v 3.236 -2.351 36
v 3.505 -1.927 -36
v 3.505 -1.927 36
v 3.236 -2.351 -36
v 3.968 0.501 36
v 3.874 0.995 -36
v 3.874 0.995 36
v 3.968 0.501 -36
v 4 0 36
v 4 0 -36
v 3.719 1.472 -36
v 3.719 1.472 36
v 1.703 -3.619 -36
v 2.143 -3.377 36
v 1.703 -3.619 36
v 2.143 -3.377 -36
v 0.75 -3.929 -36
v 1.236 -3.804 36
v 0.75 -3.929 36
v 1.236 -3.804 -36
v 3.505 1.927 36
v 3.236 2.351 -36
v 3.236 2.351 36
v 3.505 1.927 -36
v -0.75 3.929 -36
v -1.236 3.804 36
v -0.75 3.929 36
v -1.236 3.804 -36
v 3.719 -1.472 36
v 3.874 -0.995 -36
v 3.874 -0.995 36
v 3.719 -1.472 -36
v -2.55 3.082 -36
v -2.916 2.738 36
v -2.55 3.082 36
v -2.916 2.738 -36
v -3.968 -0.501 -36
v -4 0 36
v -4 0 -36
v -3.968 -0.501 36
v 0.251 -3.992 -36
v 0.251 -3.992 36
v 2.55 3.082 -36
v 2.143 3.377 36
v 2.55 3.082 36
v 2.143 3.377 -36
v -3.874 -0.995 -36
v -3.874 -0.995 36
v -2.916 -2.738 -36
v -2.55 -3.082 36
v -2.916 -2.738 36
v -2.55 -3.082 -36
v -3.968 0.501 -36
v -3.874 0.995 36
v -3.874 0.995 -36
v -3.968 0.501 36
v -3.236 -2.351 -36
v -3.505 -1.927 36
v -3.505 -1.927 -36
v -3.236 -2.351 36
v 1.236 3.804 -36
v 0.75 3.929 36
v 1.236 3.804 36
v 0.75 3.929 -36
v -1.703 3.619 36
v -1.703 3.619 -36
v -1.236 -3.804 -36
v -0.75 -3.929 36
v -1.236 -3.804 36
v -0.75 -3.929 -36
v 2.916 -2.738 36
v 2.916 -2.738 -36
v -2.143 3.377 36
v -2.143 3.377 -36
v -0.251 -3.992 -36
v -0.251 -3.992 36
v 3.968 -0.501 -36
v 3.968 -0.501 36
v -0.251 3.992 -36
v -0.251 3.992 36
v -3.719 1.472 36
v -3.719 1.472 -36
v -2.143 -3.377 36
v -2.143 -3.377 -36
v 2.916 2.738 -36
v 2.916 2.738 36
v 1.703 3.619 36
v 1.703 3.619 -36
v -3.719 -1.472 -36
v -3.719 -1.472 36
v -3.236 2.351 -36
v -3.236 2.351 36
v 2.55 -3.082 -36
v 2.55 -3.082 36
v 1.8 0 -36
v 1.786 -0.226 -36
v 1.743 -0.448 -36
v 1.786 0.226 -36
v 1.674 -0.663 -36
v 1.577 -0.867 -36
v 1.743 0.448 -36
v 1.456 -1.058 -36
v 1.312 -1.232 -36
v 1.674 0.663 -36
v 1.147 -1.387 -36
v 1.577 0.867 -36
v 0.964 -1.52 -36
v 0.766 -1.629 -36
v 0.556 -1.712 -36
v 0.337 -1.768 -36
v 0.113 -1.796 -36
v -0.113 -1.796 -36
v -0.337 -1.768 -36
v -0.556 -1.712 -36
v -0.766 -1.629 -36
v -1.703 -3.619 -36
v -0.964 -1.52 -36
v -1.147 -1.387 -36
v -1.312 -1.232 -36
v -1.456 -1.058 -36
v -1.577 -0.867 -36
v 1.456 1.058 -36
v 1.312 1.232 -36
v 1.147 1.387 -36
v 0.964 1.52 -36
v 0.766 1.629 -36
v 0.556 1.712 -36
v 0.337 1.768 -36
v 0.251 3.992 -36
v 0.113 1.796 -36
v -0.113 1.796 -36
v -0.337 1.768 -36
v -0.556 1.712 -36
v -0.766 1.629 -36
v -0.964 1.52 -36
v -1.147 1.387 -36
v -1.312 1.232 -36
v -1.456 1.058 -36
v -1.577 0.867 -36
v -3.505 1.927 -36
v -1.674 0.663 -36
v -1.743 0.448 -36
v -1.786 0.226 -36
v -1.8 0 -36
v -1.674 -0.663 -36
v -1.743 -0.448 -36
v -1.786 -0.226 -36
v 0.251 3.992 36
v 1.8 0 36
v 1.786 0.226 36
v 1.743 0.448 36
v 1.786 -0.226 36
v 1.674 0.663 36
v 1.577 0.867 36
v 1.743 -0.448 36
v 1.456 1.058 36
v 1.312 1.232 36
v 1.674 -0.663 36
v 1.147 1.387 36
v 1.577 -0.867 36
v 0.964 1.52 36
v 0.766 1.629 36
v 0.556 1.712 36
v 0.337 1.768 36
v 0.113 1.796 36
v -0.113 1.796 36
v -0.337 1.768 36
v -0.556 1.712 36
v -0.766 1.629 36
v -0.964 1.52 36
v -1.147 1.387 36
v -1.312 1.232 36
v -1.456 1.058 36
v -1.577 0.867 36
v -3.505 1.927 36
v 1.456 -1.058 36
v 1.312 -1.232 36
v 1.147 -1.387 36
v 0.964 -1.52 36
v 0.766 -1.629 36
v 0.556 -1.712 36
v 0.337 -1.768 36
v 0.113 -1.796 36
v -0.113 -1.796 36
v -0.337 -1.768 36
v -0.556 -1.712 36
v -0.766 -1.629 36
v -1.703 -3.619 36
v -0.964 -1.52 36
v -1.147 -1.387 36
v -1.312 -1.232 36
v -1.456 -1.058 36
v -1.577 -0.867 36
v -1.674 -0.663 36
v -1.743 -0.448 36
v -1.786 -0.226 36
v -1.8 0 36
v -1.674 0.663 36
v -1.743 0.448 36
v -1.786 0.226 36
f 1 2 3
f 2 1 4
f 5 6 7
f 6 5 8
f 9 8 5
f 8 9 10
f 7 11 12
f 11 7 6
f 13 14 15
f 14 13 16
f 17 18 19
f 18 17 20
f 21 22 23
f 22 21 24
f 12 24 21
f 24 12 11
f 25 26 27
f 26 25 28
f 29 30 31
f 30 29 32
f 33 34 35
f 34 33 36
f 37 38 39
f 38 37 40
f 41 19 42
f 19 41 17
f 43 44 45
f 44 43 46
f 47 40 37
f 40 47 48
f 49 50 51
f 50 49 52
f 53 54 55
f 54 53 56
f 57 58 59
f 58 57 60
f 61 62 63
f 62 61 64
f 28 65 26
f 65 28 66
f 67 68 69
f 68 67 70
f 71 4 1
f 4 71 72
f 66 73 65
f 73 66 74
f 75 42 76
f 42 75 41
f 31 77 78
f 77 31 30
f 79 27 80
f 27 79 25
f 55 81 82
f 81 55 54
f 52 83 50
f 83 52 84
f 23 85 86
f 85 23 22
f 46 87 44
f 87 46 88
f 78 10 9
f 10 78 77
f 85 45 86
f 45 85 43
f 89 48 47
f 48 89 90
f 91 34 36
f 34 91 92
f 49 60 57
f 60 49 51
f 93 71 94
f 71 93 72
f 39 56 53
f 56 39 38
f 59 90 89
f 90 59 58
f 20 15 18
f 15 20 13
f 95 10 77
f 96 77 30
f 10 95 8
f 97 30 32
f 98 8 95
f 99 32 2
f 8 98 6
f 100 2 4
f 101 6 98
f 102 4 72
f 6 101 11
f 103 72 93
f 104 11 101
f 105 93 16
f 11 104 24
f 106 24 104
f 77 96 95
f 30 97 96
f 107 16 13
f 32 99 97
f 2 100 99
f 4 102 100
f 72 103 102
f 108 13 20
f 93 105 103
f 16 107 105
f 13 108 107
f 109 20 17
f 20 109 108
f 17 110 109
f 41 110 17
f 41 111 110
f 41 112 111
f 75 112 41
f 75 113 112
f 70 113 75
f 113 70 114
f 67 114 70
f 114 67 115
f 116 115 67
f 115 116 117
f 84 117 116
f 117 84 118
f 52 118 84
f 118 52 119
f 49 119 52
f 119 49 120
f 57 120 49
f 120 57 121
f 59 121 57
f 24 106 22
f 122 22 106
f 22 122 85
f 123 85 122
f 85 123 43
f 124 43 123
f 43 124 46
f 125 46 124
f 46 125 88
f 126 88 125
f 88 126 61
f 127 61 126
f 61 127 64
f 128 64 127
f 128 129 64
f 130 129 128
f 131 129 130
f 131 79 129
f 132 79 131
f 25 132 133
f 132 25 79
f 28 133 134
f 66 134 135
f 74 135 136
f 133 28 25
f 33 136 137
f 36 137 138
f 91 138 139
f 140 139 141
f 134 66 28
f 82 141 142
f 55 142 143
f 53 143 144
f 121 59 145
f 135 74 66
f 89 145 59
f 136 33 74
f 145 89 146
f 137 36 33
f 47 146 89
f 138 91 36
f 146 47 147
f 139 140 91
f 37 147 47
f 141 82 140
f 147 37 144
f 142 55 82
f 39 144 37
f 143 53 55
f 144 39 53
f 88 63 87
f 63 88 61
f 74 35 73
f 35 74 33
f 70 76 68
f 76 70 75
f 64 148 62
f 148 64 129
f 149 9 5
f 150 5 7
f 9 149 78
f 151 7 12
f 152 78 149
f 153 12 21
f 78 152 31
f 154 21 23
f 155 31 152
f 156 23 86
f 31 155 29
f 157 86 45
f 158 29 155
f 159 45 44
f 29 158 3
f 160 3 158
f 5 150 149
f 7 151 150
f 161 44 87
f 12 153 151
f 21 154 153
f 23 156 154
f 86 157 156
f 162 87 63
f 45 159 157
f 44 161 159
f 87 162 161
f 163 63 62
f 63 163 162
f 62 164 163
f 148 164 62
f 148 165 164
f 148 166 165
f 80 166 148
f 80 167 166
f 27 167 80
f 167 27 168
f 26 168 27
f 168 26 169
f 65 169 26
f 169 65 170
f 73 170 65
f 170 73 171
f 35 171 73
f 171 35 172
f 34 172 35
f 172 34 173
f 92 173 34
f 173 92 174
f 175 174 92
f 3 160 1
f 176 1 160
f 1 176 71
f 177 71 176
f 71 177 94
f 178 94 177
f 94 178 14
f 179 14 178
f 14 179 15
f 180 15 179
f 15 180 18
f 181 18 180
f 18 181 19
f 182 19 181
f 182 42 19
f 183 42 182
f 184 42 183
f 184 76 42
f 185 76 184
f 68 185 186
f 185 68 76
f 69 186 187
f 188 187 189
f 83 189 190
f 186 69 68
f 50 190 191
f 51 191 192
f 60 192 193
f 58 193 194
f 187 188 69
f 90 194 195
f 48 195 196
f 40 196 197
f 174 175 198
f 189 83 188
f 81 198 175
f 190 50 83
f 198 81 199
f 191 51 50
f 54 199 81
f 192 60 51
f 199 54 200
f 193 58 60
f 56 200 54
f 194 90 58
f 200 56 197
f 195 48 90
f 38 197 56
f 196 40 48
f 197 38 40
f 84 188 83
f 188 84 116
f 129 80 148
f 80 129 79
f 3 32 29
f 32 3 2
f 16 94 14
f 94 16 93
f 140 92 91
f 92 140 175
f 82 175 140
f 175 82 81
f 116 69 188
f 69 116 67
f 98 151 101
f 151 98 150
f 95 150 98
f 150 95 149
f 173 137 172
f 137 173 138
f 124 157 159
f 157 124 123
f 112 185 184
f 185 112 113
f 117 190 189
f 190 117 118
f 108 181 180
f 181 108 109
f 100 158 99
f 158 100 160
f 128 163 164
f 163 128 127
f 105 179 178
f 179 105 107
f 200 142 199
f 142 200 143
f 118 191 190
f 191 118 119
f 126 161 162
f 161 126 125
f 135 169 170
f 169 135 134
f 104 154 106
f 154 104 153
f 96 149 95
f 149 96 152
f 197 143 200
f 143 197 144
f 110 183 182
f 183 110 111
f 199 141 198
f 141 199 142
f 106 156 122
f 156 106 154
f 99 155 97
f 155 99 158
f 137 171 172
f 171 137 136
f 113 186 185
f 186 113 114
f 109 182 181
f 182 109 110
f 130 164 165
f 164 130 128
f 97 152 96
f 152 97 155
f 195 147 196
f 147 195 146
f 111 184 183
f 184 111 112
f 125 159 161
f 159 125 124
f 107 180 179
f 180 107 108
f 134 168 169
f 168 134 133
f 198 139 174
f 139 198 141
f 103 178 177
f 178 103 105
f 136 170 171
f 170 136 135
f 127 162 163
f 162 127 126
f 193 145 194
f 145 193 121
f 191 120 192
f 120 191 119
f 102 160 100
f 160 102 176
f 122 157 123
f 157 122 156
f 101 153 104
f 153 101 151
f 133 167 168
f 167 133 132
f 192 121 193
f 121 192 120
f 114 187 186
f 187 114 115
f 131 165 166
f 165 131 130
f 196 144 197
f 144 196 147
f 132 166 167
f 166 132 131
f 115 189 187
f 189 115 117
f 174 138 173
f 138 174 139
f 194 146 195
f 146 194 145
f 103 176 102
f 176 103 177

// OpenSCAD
$fn = 50;


difference() {
	union() {
		translate(v = [0, 0, -36.0000000000]) {
			cylinder(h = 72, r = 4.0000000000);
		}
	}
	union() {
		#translate(v = [0, 0, -100.0000000000]) {
			cylinder(h = 200, r = 1.8000000000);
		}
	}
}
